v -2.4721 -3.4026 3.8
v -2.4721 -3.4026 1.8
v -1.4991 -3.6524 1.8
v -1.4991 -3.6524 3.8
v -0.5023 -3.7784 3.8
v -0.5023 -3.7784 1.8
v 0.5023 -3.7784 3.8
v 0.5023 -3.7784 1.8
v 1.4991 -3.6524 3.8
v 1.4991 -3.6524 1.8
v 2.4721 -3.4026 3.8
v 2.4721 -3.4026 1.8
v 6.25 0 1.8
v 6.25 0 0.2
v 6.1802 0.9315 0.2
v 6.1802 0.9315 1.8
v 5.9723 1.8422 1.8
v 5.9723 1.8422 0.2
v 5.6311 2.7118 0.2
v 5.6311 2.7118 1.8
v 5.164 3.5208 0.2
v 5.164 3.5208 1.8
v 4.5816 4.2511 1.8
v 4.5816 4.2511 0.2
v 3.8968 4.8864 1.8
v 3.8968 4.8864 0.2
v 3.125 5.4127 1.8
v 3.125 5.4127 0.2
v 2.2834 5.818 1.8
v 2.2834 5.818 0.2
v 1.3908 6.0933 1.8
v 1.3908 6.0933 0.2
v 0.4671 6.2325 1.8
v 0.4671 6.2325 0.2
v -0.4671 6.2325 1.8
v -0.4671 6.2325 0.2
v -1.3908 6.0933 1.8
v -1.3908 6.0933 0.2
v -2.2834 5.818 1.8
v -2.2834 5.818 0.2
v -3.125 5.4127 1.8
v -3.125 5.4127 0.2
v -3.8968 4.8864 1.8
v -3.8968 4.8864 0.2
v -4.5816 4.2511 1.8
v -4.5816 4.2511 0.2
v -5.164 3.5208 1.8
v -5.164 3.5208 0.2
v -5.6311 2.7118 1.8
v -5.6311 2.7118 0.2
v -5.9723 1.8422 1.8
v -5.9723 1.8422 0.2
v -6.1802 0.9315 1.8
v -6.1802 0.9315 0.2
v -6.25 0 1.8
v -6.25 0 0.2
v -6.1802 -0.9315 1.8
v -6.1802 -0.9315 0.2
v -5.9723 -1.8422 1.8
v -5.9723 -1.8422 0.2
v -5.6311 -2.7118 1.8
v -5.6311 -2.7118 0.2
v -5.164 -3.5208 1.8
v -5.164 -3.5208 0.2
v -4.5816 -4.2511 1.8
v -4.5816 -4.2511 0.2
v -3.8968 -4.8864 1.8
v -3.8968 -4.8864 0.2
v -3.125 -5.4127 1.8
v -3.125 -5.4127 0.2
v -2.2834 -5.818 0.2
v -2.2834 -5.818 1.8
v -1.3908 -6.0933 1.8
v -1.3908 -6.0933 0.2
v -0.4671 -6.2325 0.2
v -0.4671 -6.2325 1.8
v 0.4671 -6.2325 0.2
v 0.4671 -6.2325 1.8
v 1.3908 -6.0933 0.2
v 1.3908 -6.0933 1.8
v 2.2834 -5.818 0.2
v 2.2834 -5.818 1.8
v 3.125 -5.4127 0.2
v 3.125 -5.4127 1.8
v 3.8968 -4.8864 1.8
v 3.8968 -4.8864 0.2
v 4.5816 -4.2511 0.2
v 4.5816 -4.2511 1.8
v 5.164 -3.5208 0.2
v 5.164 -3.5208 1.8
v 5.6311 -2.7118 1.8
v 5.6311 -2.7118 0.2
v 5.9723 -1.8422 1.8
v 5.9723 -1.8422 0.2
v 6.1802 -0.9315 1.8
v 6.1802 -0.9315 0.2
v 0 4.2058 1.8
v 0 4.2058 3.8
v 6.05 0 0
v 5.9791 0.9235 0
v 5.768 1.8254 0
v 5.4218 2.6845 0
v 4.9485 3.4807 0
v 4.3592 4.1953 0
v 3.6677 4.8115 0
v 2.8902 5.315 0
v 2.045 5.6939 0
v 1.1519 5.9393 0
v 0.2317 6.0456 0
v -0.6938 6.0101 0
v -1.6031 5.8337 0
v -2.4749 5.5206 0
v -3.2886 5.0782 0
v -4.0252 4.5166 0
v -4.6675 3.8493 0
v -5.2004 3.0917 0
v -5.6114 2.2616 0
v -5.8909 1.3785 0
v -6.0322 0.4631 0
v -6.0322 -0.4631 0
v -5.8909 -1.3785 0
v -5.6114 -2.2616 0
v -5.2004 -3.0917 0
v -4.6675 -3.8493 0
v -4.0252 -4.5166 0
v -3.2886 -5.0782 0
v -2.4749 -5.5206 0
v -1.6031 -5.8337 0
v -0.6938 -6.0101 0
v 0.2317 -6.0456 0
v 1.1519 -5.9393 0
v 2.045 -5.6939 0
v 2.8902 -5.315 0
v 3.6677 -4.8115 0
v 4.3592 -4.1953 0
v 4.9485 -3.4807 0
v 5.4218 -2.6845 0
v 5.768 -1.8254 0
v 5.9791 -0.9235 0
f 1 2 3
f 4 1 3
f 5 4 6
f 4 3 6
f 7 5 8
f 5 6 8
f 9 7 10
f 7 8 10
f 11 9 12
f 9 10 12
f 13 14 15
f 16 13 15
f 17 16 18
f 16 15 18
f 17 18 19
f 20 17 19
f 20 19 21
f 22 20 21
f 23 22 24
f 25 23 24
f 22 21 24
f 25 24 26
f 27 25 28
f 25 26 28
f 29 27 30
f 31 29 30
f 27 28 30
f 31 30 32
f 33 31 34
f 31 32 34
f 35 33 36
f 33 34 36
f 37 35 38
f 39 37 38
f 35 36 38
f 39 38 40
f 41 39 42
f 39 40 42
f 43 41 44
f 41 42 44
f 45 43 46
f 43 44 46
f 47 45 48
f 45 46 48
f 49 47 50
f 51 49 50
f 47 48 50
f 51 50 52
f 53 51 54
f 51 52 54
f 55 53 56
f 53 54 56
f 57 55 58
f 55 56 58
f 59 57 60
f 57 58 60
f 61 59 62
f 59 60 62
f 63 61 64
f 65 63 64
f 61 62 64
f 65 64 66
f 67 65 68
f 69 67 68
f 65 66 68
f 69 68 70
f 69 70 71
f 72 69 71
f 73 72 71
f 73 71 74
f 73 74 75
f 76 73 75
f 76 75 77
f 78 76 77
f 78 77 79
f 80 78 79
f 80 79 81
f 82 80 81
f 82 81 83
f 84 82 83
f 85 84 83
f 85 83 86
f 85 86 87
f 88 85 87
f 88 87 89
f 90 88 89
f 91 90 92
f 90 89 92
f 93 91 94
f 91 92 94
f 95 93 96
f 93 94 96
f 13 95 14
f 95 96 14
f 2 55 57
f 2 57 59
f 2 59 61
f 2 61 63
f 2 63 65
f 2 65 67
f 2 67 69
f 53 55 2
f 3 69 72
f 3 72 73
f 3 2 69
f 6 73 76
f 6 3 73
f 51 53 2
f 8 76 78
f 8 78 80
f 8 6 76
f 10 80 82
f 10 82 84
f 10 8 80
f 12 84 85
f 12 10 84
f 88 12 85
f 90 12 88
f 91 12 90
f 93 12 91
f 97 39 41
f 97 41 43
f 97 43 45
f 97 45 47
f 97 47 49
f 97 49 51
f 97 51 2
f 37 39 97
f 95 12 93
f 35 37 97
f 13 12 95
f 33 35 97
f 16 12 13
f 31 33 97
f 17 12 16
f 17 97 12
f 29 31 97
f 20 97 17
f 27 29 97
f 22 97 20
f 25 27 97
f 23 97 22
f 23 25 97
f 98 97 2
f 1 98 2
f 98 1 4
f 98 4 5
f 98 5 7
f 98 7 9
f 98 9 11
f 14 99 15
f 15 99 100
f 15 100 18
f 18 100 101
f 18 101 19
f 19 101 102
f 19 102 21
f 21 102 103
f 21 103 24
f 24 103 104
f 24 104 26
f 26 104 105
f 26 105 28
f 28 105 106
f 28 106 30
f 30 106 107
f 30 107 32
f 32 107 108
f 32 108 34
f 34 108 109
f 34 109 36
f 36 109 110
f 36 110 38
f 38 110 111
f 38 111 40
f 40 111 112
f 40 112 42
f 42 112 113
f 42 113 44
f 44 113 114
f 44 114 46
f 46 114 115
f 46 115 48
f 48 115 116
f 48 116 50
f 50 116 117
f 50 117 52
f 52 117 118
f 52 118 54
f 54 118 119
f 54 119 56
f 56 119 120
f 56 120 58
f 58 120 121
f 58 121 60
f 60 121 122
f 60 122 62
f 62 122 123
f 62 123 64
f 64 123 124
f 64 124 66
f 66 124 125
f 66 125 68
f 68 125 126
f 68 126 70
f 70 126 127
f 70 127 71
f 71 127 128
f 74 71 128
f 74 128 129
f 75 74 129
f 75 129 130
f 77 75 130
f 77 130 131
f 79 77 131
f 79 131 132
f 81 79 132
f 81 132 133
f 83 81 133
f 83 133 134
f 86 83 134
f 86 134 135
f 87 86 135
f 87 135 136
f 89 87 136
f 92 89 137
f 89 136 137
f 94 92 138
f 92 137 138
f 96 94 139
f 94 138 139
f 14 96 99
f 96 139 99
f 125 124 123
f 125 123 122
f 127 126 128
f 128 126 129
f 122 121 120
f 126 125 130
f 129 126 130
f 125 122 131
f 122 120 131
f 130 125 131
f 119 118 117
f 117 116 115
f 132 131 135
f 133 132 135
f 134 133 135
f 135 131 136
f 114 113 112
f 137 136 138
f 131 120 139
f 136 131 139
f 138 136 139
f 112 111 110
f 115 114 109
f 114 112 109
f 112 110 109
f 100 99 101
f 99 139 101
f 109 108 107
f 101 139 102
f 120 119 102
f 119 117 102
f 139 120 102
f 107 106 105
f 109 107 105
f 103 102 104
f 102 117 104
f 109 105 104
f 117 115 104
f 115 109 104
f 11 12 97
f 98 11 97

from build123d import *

# Parameters (mm, degrees)
F0_R     = 6.25
F1_DEPTH = 1.8
F3_DEPTH = 2
F4_SIZE  = 0.2


with BuildPart() as f1:
    # F0 (on Top) → F1 (new body)
    with BuildSketch(Plane.XY):
        Circle(F0_R)
    extrude(amount=F1_DEPTH)

    # F2 (on face) → F3 (join)
    with BuildSketch(Plane.XY.offset(1.8)):
        with BuildLine():
            Line((2.472136, -3.402603), (0, 4.205849))
            Line((0, 4.205849), (-2.472136, -3.402603))
            ThreePointArc((-2.472136, -3.402603), (0, -3.794151), (2.472136, -3.402603))
        make_face()
    extrude(amount=F3_DEPTH)

    # F4
    f4_edges = [f1.edges().sort_by_distance(p)[0] for p in [
        (-6.25, 0, 0),
    ]]
    chamfer(f4_edges, length=F4_SIZE)


solid = f1.part
